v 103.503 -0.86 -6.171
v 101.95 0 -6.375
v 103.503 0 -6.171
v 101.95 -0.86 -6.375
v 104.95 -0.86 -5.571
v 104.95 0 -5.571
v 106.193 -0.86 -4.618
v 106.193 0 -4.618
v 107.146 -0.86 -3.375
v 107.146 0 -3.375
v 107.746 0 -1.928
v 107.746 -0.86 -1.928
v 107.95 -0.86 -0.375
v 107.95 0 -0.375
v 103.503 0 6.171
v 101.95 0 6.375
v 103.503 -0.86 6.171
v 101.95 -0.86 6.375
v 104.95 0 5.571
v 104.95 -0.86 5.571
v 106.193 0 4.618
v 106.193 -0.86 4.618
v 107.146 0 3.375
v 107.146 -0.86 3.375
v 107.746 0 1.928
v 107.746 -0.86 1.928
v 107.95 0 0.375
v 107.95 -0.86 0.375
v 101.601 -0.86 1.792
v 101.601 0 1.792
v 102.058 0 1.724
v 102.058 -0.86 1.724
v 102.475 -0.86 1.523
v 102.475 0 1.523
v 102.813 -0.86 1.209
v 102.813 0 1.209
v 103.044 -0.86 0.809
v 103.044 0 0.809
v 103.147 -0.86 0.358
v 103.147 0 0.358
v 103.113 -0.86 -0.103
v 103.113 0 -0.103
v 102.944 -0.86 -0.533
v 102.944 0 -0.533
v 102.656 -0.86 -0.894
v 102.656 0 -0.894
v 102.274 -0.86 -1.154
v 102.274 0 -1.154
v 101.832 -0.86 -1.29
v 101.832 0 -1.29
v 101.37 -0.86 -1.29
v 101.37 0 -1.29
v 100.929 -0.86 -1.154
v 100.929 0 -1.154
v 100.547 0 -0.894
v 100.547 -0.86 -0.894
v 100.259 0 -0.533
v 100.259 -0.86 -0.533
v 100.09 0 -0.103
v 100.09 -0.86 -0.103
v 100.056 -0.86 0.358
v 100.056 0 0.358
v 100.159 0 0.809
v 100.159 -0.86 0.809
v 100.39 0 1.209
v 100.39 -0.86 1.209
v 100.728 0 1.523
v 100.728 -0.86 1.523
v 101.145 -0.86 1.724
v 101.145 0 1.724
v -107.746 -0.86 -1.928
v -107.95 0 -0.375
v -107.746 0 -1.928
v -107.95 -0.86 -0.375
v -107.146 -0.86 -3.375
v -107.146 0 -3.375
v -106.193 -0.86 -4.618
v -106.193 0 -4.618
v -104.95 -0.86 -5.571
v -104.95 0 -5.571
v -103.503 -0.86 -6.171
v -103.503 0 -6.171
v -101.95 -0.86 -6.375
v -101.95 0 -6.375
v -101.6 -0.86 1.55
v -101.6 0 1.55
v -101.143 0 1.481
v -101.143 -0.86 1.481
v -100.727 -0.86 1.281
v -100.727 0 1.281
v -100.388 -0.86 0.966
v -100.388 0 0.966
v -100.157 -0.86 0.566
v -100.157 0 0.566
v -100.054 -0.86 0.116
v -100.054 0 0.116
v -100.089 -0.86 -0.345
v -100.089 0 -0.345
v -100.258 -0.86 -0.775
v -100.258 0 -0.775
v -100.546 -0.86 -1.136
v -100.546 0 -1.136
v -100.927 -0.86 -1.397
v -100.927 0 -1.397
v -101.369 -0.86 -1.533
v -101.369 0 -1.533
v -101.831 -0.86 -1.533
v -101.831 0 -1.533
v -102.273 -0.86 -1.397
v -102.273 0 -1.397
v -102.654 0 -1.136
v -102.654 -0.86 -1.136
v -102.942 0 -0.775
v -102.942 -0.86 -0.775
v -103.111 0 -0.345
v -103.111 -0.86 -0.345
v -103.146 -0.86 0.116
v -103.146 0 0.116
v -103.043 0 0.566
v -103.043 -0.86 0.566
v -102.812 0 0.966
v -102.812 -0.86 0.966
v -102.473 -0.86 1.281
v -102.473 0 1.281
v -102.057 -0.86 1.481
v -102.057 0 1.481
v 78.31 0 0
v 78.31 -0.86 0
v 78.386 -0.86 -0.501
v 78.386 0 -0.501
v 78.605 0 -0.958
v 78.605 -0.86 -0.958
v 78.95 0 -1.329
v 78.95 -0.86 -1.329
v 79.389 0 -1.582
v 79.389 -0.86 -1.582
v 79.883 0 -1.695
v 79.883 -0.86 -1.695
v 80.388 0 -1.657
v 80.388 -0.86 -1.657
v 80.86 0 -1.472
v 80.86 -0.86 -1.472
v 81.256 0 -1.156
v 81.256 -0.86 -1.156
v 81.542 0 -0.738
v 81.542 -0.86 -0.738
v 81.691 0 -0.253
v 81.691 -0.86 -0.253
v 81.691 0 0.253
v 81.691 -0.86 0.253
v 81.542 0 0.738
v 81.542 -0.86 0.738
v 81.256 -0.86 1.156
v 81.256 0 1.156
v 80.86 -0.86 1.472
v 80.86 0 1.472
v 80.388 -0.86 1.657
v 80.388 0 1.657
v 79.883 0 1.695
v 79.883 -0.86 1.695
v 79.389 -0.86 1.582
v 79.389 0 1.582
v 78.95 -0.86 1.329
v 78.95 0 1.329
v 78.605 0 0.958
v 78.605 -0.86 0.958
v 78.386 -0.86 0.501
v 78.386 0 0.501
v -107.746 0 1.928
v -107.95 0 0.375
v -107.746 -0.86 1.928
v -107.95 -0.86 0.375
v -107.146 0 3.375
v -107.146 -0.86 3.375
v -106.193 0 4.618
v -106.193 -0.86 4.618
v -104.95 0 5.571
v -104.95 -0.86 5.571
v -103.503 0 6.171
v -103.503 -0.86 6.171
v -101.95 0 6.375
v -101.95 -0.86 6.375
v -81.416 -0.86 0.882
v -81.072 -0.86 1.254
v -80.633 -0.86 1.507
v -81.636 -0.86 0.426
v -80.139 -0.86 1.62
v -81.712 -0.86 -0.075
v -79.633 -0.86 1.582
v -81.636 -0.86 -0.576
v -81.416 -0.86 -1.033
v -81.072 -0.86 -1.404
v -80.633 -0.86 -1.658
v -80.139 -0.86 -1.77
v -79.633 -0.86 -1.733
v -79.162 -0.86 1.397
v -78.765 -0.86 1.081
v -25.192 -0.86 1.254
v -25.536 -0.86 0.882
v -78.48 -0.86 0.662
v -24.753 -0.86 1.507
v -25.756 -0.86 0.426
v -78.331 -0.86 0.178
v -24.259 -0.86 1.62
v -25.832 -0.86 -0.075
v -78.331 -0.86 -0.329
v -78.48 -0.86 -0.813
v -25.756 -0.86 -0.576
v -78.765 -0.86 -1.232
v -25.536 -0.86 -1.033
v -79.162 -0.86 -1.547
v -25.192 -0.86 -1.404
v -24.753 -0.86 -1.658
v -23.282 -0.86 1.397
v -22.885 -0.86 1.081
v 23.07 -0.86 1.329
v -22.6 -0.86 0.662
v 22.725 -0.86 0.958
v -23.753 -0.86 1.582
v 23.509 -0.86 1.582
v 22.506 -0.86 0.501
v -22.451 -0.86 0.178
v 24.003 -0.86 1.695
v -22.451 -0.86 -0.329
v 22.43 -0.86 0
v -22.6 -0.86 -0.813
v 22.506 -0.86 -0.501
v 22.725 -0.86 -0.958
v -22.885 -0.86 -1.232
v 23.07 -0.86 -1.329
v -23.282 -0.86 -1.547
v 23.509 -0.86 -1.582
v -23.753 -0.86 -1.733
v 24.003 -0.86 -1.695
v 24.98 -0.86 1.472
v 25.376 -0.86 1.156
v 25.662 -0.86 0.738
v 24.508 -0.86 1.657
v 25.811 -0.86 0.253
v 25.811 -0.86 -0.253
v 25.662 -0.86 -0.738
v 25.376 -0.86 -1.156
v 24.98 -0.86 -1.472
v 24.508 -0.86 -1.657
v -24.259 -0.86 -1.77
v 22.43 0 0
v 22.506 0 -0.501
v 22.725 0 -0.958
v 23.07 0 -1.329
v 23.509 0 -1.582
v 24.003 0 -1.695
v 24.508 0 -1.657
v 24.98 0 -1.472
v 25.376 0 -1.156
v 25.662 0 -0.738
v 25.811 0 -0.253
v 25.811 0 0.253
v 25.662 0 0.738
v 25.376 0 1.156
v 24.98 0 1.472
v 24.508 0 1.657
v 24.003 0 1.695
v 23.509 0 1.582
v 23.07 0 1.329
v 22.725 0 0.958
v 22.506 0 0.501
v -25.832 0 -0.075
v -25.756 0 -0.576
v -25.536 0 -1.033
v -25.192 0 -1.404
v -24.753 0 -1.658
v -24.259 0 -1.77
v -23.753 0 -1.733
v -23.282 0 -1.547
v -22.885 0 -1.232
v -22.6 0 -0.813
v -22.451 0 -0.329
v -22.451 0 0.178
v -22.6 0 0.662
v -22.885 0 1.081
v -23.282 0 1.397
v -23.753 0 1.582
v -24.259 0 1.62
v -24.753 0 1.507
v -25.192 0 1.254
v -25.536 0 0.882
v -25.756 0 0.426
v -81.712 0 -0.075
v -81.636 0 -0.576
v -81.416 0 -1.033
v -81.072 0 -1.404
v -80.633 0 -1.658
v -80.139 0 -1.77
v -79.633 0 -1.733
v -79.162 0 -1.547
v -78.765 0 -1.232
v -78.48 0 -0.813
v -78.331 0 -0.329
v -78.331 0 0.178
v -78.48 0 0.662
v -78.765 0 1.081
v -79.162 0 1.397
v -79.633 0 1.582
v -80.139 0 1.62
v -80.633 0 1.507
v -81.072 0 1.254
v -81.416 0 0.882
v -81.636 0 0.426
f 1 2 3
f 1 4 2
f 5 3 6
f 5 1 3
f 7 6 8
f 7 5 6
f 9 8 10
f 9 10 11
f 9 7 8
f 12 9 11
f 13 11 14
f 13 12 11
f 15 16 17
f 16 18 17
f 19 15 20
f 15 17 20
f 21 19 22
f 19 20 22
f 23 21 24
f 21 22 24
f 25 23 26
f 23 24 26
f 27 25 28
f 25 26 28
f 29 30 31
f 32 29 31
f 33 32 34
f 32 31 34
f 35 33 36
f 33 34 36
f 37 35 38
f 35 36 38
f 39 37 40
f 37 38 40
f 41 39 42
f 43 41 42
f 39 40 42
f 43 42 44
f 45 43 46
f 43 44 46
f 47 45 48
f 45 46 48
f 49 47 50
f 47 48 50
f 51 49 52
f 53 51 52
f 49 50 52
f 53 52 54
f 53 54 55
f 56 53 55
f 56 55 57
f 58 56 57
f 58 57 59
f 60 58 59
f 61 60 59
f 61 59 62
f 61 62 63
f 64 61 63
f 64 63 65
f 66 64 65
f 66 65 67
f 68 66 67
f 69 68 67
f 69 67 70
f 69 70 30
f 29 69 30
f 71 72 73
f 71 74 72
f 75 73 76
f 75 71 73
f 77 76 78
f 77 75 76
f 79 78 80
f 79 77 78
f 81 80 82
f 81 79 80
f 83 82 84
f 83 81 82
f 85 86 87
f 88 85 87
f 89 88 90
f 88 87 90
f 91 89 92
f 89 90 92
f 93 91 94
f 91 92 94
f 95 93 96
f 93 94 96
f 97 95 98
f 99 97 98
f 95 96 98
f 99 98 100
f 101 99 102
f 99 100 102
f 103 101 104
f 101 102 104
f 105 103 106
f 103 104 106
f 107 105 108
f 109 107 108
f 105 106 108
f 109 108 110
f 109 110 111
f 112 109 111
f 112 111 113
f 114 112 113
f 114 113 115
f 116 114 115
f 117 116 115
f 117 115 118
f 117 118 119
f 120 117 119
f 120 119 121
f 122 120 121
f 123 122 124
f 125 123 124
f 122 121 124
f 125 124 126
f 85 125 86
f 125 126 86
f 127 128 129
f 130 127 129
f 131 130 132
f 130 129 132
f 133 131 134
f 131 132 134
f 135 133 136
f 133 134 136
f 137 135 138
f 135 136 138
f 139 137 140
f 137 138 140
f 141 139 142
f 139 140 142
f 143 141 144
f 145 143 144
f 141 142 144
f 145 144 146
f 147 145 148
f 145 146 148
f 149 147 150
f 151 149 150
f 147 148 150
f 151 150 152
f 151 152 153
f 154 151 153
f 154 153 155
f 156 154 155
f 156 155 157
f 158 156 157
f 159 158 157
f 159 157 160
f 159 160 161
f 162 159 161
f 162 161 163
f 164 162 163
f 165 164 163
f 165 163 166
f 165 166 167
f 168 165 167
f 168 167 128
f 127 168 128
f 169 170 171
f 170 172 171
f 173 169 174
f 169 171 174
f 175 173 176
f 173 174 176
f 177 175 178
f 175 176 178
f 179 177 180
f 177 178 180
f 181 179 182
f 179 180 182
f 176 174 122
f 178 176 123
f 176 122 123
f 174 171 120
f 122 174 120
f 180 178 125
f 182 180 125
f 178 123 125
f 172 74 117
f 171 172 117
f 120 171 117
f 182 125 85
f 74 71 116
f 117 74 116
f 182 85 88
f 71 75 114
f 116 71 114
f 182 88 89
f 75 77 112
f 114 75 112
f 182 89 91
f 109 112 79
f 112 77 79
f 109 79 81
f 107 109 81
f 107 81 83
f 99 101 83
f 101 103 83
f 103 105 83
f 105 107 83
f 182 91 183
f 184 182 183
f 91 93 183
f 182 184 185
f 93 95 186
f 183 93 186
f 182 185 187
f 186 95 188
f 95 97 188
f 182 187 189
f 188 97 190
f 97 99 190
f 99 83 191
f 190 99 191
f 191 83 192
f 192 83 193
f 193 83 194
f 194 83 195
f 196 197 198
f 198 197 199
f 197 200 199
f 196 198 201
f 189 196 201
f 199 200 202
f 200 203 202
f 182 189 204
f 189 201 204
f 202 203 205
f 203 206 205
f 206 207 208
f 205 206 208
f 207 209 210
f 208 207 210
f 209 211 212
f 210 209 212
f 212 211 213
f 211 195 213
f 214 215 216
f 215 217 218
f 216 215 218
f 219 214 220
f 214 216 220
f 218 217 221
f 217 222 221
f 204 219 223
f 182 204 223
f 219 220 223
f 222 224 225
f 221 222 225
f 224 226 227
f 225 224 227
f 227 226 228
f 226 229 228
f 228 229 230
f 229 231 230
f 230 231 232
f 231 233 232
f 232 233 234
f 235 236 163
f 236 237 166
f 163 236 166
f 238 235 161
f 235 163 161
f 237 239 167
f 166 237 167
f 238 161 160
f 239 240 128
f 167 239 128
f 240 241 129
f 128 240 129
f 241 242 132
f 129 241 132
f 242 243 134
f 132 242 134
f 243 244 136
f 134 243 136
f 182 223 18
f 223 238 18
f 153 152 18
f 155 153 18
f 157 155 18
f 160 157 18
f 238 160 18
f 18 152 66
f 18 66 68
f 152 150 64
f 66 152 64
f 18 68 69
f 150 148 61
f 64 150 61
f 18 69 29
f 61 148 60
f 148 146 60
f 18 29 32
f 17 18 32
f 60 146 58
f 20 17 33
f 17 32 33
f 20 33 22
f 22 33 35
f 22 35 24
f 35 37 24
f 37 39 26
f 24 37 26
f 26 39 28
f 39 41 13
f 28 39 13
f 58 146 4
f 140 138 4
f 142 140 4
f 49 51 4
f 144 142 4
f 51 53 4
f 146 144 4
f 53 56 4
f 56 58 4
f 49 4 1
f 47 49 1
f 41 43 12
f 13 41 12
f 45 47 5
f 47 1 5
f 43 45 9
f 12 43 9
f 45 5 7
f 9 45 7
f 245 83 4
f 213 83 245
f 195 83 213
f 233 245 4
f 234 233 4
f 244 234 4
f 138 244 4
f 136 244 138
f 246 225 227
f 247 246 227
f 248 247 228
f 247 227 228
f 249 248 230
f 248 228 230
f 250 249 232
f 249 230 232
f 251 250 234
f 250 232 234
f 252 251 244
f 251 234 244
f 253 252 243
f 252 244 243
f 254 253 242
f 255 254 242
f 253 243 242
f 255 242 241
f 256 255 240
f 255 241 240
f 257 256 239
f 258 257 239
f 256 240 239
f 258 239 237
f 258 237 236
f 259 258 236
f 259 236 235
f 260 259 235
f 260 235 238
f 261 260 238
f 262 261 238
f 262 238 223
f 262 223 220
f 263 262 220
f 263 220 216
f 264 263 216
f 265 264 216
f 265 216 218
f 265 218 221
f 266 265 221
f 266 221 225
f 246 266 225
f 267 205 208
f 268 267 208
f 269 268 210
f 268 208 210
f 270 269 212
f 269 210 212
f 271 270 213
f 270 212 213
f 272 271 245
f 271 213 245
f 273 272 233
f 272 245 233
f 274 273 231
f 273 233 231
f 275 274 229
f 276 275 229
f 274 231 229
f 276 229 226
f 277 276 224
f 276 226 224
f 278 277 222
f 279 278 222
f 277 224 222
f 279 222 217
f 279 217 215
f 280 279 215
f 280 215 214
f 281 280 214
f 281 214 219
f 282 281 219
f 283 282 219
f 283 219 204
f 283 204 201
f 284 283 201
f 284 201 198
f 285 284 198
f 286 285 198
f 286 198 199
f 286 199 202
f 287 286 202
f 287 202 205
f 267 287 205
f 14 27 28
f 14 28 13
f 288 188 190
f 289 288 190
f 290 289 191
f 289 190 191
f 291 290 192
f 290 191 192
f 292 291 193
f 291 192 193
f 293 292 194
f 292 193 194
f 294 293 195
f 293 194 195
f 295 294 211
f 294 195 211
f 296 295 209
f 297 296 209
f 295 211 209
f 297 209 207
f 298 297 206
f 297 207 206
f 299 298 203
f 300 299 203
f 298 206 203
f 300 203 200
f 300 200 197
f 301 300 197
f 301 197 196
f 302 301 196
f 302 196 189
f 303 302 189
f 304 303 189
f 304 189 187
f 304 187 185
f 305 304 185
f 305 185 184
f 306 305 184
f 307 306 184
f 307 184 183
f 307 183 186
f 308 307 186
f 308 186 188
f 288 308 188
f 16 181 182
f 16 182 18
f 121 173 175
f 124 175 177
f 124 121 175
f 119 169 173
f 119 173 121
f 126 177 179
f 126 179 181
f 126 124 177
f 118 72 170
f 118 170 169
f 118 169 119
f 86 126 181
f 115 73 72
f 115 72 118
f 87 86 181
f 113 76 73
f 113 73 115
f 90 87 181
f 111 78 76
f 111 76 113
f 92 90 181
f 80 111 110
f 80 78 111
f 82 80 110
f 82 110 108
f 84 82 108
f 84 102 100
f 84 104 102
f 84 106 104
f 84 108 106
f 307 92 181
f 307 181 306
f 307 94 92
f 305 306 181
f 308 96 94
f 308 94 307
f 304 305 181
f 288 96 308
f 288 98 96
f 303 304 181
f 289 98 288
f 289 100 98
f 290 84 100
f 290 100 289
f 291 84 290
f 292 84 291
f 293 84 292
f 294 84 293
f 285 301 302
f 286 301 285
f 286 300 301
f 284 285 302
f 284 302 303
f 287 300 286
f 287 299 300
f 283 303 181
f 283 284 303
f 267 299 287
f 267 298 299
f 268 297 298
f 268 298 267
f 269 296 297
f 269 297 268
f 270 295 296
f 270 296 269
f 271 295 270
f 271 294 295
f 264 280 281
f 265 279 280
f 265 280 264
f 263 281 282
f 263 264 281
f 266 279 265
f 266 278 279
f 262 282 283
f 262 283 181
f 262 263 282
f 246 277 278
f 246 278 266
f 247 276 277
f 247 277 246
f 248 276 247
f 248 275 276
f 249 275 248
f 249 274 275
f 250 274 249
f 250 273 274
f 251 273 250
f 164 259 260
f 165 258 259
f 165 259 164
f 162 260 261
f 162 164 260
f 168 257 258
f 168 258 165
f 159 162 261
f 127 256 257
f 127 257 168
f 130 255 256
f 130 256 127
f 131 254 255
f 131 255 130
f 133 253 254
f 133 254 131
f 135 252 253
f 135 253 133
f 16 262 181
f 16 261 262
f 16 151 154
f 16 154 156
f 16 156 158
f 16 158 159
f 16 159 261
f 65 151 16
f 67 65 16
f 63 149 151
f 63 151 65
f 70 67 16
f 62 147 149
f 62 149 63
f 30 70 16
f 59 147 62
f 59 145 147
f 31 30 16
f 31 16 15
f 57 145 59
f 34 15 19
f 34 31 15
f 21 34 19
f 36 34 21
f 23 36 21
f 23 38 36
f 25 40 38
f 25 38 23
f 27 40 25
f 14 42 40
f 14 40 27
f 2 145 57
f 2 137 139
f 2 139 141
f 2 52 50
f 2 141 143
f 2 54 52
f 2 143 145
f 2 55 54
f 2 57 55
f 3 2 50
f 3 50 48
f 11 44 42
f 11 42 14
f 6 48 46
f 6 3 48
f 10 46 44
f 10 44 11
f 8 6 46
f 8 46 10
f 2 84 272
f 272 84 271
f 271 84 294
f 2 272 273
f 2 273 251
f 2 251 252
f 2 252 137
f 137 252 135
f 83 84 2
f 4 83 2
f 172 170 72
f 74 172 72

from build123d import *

# Parameters (mm, degrees)
SKETCH1_W                = 215.9
SKETCH1_H                = 12.75
SKETCH1_R                = 1.55
BASE_FLANGE1_DEPTH       = 0.86
FILLET1_R                = 6
M3_CLEARANCE_HOLE1_D     = 3.4
M3_CLEARANCE_HOLE1_DEPTH = 1.29
M3_CLEARANCE_HOLE1_TIP   = 1.021463052
SKETCH14_R               = 1.55
CUT_EXTRUDE1_DEPTH       = 82


# Sheet-metal steps are written as plain solids
with BuildPart() as part:
    # Sketch1 → Base-Flange1 (new body)
    with BuildSketch(Plane(origin=(0, 0, 0), x_dir=(1, 0, 0), z_dir=(0, 1, 0))):
        Rectangle(SKETCH1_W, SKETCH1_H)
        with Locations(Location((-101.6, 0, 0), (0, 0, 270))):
            Circle(SKETCH1_R, mode=Mode.SUBTRACT)
    extrude(amount=-BASE_FLANGE1_DEPTH)

    # Fillet1
    fillet1_edges = [part.edges().sort_by_distance(p)[0] for p in [
        (-107.95, -0.43, -6.375),
        (107.95, -0.43, -6.375),
        (107.95, -0.43, 6.375),
        (-107.95, -0.43, 6.375),
    ]]
    fillet(fillet1_edges, radius=FILLET1_R)

    # M3 Clearance Hole1
    with Locations(Plane(origin=(0, 0, 0), x_dir=(1, 0, 0), z_dir=(0, 1, 0))):
        with Locations((-80.011608413, 0.075207541), (-24.131608413, 0.075207541), (80.01, 0), (24.13, 0)):
            Hole(M3_CLEARANCE_HOLE1_D / 2, depth=M3_CLEARANCE_HOLE1_DEPTH)
            with Locations((0, 0, -(M3_CLEARANCE_HOLE1_DEPTH + M3_CLEARANCE_HOLE1_TIP / 2))):  # 118° drill point
                Cone(0, M3_CLEARANCE_HOLE1_D / 2, M3_CLEARANCE_HOLE1_TIP, mode=Mode.SUBTRACT)

    # Sketch14 → Cut-Extrude1 (cut)
    with BuildSketch(Plane(origin=(0, 0, 0), x_dir=(1, 0, 0), z_dir=(0, 1, 0))):
        with Locations(Location((101.601385273, -0.242368773, 0), (0, 0, 270))):
            Circle(SKETCH14_R)
    extrude(amount=-CUT_EXTRUDE1_DEPTH, mode=Mode.SUBTRACT)


solid = part.part
